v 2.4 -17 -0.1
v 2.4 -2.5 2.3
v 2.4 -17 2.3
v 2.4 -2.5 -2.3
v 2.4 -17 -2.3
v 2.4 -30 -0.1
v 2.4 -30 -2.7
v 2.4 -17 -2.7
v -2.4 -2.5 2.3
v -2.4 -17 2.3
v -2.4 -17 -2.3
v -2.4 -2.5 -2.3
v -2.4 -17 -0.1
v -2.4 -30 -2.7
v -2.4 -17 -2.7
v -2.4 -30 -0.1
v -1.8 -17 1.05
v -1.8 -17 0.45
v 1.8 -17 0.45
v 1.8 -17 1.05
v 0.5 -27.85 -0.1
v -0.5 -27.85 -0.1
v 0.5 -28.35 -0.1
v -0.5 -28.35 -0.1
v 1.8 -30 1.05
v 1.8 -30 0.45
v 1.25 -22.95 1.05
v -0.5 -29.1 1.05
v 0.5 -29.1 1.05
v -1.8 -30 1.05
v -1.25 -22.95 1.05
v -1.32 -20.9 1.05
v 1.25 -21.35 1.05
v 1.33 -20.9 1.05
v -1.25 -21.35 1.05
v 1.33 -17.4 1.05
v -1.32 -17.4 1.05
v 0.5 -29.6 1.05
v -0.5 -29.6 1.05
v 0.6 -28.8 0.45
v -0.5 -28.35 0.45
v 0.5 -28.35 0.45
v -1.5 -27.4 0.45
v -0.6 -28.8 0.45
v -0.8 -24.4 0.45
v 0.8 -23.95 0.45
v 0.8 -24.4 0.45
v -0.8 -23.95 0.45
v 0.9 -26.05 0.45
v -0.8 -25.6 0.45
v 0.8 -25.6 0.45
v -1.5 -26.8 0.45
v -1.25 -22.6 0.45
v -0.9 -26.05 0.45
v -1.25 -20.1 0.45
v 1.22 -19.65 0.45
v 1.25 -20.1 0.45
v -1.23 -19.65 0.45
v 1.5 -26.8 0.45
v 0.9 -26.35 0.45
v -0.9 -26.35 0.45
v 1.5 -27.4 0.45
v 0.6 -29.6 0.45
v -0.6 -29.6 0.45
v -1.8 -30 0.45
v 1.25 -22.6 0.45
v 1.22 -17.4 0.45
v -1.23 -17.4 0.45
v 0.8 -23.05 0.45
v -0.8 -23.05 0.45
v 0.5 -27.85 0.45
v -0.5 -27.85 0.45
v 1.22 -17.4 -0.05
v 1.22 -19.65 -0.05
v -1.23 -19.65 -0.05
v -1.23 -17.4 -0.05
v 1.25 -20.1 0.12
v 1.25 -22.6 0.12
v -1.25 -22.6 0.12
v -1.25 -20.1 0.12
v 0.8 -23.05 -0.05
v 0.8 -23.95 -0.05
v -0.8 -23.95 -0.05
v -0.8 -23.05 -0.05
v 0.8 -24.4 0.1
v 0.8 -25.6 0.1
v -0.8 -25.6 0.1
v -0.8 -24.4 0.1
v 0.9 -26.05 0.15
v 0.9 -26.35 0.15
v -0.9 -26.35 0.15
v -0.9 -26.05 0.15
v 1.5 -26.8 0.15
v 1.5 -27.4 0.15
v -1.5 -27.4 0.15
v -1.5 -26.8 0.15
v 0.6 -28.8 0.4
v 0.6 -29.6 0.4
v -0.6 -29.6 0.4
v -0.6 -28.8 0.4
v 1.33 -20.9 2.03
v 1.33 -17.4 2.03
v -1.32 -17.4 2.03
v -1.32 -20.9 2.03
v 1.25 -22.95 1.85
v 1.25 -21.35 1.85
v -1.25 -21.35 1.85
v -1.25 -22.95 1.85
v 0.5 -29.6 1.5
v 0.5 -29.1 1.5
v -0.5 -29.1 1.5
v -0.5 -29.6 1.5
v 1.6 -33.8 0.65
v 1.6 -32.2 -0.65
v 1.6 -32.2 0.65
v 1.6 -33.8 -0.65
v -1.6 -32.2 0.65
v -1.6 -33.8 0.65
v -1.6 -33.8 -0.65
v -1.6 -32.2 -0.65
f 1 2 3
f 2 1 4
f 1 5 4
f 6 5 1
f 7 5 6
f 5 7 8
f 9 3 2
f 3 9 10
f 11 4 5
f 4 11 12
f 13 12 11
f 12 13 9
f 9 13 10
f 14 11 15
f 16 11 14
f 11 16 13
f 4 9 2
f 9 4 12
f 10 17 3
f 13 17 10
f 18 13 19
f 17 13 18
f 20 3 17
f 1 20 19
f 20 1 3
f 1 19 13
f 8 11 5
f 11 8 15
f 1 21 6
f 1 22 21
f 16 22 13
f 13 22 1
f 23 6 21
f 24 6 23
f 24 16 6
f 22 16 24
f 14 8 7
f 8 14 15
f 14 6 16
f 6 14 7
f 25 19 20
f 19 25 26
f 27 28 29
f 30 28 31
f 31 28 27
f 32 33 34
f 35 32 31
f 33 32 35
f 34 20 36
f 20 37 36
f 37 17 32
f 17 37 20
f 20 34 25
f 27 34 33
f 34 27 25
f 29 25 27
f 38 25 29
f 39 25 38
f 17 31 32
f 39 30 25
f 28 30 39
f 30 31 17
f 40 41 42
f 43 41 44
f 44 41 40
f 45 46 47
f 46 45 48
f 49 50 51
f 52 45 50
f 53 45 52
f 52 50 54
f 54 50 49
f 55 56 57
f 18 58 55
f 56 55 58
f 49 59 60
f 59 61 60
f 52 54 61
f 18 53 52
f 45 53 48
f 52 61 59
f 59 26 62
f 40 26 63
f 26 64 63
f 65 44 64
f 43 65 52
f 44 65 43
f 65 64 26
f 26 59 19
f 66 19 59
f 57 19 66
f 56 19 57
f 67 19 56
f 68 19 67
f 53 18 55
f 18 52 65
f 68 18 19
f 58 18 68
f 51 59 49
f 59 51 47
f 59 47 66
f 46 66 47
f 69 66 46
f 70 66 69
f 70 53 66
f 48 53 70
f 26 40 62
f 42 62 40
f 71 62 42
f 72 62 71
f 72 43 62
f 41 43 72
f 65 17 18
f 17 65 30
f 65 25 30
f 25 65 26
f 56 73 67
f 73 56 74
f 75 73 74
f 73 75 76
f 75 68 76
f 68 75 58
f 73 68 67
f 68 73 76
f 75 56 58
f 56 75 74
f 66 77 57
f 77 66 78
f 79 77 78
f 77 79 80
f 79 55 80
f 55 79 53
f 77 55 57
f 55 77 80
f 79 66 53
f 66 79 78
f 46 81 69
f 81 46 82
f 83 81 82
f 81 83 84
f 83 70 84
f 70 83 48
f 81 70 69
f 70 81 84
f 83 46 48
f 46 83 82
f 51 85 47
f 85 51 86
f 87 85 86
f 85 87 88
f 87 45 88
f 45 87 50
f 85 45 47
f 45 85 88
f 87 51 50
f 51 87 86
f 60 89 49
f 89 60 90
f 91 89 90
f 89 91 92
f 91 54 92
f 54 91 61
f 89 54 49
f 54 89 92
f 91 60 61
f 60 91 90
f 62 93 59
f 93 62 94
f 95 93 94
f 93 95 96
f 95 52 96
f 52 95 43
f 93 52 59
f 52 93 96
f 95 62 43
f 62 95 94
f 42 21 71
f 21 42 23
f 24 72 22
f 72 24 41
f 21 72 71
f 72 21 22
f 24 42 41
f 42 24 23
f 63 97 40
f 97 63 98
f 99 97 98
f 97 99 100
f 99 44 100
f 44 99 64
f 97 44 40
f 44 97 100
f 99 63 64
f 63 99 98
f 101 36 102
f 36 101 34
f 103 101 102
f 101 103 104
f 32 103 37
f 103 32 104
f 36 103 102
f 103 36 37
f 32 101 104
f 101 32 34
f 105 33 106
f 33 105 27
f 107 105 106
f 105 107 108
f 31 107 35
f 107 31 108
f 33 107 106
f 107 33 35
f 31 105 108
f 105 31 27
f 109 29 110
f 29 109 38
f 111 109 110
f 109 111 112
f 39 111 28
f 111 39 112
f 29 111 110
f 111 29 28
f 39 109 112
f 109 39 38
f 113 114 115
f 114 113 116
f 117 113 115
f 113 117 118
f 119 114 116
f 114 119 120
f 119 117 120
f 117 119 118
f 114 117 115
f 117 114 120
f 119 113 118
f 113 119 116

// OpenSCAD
// ============================================================
//  THE BAR  —  6 x 6 x 35 mm  voice-note pendant
//  Every real component at its real coordinate.
//
//  VIEW options:
//    "assembled"  - the finished object
//    "ghost"      - see-through case, parts visible inside   <-- start here
//    "internals"  - just the parts, no case
//    "section"    - cut in half lengthways
//    "exploded"   - pulled apart
// ============================================================

VIEW = "ghost";

// ---------- THE BOX ----------
L    = 35.0;   // total length
W    = 6.0;    // width and depth (square)
WALL = 0.3;    // tube wall
CH   = 0.35;   // edge chamfer
CAV  = W - 2*WALL;            // 5.4 cavity

// ---------- ZONES DOWN THE LENGTH ----------
CAP_T  = 2.5;                 // top cap + chain bail
BATT_L = 14.5;                // battery only, thick step
BOARD_L= 13.0;                // board over the thin battery step
TIP_L  = 5.0;                 // black dielectric tip: antenna + light

Y_BATT  = CAP_T;
Y_BOARD = CAP_T + BATT_L;
Y_TIP   = L - TIP_L;

// ---------- BATTERY (custom stepped pouch) ----------
CELL_W  = 4.8;
CELL_T1 = 2.6;   // thin step, sits under the board
CELL_T2 = 4.6;   // thick step, fills the bar above the board

// ---------- BOARD ----------
PCB_W = 3.6;
PCB_T = 0.6;
// board sits on top of the thin battery step, with room underneath for the
// bottom-side components (0.55 tall). cell top = -CAV/2 + CELL_T1 = -0.1
PCB_Z = -CAV/2 + CELL_T1 + 0.55 + PCB_T/2;   // = 0.75

$fn = 40;

// ============================================================
//  HELPERS   (+Y runs DOWN the bar from the top)
// ============================================================

module bar_solid(len, width, ch=CH) {
    hull() {
        translate([0,-len,0]) linear_extrude(.01) square([width-2*ch, width], center=true);
        translate([0,-len,0]) linear_extrude(.01) square([width, width-2*ch], center=true);
        linear_extrude(.01) square([width-2*ch, width], center=true);
        linear_extrude(.01) square([width, width-2*ch], center=true);
    }
}

module tube(len) {
    difference() {
        bar_solid(len, W);
        translate([0,.01,0]) bar_solid(len+.02, CAV, ch=.15);
    }
}

// a component: x = mm from LEFT edge of board, y = mm down the BAR, z-up or z-down
module part(name, xoff, ybar, xs, ys, zh, up=true) {
    zbase = up ? PCB_Z + PCB_T/2 : PCB_Z - PCB_T/2 - zh;
    translate([-PCB_W/2 + xoff, -ybar - ys, zbase])
        cube([xs, ys, zh]);
}

// ============================================================
//  THE CASE
// ============================================================

module case_metal() {
    color("#C2C9CE") difference() {
        union() {
            translate([0,-CAP_T,0]) bar_solid(CAP_T, W);       // top cap
            translate([0,-Y_TIP,0]) tube(Y_TIP - CAP_T);       // the tube
        }
        // button bore, +X side face, centred 22.15 mm down
        translate([W/2, -22.15, 0]) rotate([0,90,0]) translate([0,0,-W]) cylinder(d=2.7, h=W);
        // mic port, +Z front face, 19.15 mm down
        translate([0, -19.15, W/2]) translate([0,0,-W]) cylinder(d=1.2, h=W);
        translate([0, -19.15, W/2-0.25]) cylinder(d=2.6, h=1);   // mesh recess
    }
    // chain bail
    color("#C2C9CE") translate([0, 1.2, 0]) rotate([90,0,0])
        rotate_extrude() translate([1.5,0]) circle(d=0.9);
}

module tip() {
    color("#22282B", 0.9) translate([0,-L,0]) bar_solid(TIP_L, W);
    // two charge pads on the bottom face
    color("#C9A227") for (x=[-1.2,1.2])
        translate([x, -L+0.1, 0]) rotate([90,0,0]) cylinder(d=1.6, h=0.3);
}

module pusher() {
    color("#E3E9ED") translate([W/2-0.05, -22.15, 0]) rotate([0,90,0])
        translate([0,0,-0.9]) cylinder(d=2.6, h=0.9);
    color("#141414") translate([W/2-0.8, -22.15, 0]) rotate([0,90,0])
        rotate_extrude() translate([1.45,0]) circle(d=0.4);
}

module mesh() {
    color("#394146") translate([0,-19.15,W/2-0.22]) cylinder(d=2.6, h=0.22);
}

// ============================================================
//  INTERNALS
// ============================================================

module battery() {
    color("#7A5230", 0.95) {
        // thick step — beside/above the board
        translate([-CELL_W/2, -Y_BOARD, -CELL_T2/2])
            cube([CELL_W, BATT_L, CELL_T2]);
        // thin step — tucked under the board
        translate([-CELL_W/2, -Y_TIP, -CAV/2])
            cube([CELL_W, BOARD_L, CELL_T1]);
    }
}

module board() {
    // the bare PCB
    color("#164D32") translate([-PCB_W/2, -Y_TIP, PCB_Z - PCB_T/2])
        cube([PCB_W, BOARD_L, PCB_T]);

    // ---- BOTTOM SIDE (faces the battery) ----
    color("#101010") part("SoC",     0.57, 17.40, 2.45, 2.25, 0.50, up=false);
    color("#101010") part("flash",   0.55, 20.10, 2.50, 2.50, 0.33, up=false);
    color("#101010") part("charger", 1.00, 23.05, 1.60, 0.90, 0.50, up=false);
    color("#9A8C5A") part("crystal", 1.00, 24.40, 1.60, 1.20, 0.35, up=false);
    color("#3A3A3A") part("rfmatch", 0.90, 26.05, 1.80, 0.30, 0.30, up=false);
    color("#3A3A3A") part("decap",   0.30, 26.80, 3.00, 0.60, 0.30, up=false);
    color("#4A4A4A") part("inductor",1.30, 27.85, 1.00, 0.50, 0.55, up=false);
    color("#B08D3A") part("padsp",   1.20, 28.80, 1.20, 0.80, 0.05, up=false);

    // ---- TOP SIDE (faces the case wall) ----
    color("#2A2A2A") part("mic",     0.48, 17.40, 2.65, 3.50, 0.98, up=true);
    color("#1A1A1A") part("switch",  0.55, 21.35, 2.50, 1.60, 0.80, up=true);
    color("#C94A2E") part("led",     1.30, 29.10, 1.00, 0.50, 0.45, up=true);

    // chip antenna, sitting inside the black tip
    color("#D8D8D8") translate([-1.6, -(L-1.2), -0.65]) cube([3.2, 1.6, 1.3]);
}

module internals() { battery(); board(); }

// ============================================================
//  VIEWS
// ============================================================

module full(explode=0) {
    translate([0,  explode*2, 0]) case_metal();
    translate([0, -explode*2, 0]) tip();
    translate([ explode*3, 0, 0]) pusher();
    translate([0, 0, explode*3]) mesh();
}

if (VIEW == "assembled") { full(); }

else if (VIEW == "ghost") {
    %full();          // transparent case
    internals();
}

else if (VIEW == "internals") { internals(); }

else if (VIEW == "exploded") {
    full(explode=2);
    translate([0,0,-9]) internals();
}

else if (VIEW == "section") {
    difference() { full(); translate([0,-L-2,-W]) cube([W,L+4,2*W]); }
    difference() { internals(); translate([0,-L-2,-W]) cube([W,L+4,2*W]); }
}

// ---------- checks printed to the console ----------
echo(str("LENGTH  ", CAP_T,"+",BATT_L,"+",BOARD_L,"+",TIP_L," = ",
         CAP_T+BATT_L+BOARD_L+TIP_L, " mm   (target ", L, ")"));
echo(str("CAVITY  ", CAV, " mm square"));
echo(str("STACK   mic 0.98 + pcb ", PCB_T, " + bottom 0.55 + cell ", CELL_T1,
         " = ", 0.98+PCB_T+0.55+CELL_T1, " mm  vs cavity ", CAV,
         "  -> margin ", CAV-(0.98+PCB_T+0.55+CELL_T1)));
echo(str("TOP OF MIC at z=", PCB_Z+PCB_T/2+0.98, "  cavity roof z=", CAV/2,
         "  -> clearance ", CAV/2-(PCB_Z+PCB_T/2+0.98)));
echo(str("WIDTH   board ", PCB_W, " in cavity ", CAV, " -> margin ", CAV-PCB_W));
